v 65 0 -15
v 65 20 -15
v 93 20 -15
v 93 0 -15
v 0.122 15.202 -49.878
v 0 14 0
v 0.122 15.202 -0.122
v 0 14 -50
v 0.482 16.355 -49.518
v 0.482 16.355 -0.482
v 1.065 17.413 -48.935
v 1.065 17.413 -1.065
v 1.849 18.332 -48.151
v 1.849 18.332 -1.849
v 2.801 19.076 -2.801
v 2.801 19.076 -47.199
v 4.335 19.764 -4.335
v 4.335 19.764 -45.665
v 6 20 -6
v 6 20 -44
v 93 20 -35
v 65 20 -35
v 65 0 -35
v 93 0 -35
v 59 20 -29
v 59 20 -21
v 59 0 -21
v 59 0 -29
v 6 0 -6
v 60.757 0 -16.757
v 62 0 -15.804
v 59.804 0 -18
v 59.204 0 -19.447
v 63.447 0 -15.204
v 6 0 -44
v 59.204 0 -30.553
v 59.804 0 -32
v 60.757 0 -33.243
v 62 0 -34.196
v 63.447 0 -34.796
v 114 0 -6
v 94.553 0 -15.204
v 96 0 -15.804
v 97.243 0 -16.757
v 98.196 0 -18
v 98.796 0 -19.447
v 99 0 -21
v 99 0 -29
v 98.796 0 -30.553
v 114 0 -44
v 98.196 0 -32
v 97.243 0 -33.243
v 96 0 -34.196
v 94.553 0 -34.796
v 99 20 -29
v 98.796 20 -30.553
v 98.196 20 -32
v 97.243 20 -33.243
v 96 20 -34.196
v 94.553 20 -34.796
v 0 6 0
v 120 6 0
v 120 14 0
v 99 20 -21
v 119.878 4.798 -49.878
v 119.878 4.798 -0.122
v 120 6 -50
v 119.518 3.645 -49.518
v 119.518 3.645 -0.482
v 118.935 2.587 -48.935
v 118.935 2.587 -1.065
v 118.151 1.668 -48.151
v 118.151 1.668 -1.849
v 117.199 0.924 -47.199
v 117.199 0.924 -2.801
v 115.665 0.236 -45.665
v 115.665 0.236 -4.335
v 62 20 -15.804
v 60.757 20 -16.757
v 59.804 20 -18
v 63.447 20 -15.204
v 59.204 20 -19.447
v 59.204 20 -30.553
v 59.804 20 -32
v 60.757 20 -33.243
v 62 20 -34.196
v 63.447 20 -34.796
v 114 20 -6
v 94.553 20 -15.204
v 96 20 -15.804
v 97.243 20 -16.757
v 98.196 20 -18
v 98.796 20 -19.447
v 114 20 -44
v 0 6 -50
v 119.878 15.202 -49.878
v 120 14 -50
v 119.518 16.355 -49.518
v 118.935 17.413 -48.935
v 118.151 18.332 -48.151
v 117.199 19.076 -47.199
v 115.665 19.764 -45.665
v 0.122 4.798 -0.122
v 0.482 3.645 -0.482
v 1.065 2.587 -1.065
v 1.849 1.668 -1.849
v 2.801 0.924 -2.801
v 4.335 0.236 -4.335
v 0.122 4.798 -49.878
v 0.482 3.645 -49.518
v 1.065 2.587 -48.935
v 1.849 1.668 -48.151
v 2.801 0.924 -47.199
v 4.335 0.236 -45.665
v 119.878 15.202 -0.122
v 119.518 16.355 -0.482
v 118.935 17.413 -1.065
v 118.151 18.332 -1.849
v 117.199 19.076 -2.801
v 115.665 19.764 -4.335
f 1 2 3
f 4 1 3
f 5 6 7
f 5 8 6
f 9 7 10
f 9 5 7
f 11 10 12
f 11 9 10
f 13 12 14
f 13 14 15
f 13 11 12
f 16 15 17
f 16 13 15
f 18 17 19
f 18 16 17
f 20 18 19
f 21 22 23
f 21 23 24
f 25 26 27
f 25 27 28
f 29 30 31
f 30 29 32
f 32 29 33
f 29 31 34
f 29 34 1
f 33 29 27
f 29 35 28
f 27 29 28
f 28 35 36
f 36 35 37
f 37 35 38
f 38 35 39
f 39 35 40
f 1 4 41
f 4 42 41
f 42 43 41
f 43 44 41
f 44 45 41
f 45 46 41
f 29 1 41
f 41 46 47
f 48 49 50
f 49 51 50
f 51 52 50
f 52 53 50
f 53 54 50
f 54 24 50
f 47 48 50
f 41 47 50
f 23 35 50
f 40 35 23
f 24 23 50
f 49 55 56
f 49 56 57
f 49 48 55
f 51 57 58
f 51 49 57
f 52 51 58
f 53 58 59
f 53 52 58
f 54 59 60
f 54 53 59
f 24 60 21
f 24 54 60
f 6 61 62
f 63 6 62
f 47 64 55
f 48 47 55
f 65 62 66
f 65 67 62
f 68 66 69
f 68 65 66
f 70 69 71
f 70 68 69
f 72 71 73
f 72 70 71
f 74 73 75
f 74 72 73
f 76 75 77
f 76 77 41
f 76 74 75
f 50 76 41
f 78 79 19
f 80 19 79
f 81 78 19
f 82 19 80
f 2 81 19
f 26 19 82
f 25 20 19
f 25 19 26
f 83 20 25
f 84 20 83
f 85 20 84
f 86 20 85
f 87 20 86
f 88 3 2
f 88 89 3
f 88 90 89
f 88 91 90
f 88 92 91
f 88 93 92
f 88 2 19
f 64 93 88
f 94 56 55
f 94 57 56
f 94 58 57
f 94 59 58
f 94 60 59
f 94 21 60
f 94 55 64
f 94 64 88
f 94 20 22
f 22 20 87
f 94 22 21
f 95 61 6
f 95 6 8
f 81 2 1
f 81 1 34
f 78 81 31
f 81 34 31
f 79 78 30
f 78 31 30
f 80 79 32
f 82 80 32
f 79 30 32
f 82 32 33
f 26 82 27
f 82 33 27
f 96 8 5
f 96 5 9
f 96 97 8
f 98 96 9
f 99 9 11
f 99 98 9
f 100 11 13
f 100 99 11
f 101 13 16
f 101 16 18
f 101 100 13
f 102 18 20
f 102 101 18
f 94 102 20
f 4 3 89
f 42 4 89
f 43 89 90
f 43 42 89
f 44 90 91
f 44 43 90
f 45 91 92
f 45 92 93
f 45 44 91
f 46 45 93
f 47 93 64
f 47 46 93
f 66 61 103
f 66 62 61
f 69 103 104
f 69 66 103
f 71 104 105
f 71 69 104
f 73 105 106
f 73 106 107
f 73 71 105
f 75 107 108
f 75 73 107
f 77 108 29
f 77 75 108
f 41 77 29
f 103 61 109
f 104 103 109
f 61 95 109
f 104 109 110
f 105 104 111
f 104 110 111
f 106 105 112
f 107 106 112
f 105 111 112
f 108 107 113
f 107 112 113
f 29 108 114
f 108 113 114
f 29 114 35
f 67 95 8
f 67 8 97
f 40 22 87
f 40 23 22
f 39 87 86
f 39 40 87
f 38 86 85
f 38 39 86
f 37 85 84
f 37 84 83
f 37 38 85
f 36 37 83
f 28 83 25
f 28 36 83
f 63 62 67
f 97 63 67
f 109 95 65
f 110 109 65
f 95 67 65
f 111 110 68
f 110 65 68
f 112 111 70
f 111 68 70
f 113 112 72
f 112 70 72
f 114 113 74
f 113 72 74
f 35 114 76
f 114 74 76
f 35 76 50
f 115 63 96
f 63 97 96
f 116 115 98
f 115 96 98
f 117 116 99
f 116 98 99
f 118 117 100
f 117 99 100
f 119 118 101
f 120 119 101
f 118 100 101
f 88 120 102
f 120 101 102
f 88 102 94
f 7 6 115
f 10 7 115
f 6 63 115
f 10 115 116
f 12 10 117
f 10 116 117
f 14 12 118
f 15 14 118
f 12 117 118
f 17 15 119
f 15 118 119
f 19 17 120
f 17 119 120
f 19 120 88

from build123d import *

# Parameters (mm, degrees)
ESBO_O2_W                = 120
ESBO_O2_H                = 50
RESSALTO_EXTRUS_O1_DEPTH = 20
FILETE1_R                = 6
ESBO_O3_W                = 40
ESBO_O3_H                = 20
CORTE_EXTRUS_O1_DEPTH    = 132.52946438
FILETE2_R                = 6


with BuildPart() as part:
    # Esboço2 → Ressalto-extrusão1 (new body)
    with BuildSketch(Plane(origin=(0, 0, 0), x_dir=(1, 0, 0), z_dir=(0, 1, 0))):
        with Locations((60, 25)):
            Rectangle(ESBO_O2_W, ESBO_O2_H)
    extrude(amount=RESSALTO_EXTRUS_O1_DEPTH)

    # Filete1
    filete1_edges = [part.edges().sort_by_distance(p)[0] for p in [
        (120, 20, -25),
        (60, 20, -50),
        (0, 20, -25),
        (60, 0, -50),
        (120, 0, -25),
        (60, 0, 0),
        (0, 0, -25),
        (60, 20, 0),
    ]]
    fillet(filete1_edges, radius=FILETE1_R)

    # Esboço3 → Corte-extrusão1 (cut, through all)
    with BuildSketch(Plane(origin=(0, 20, 0), x_dir=(1, 0, 0), z_dir=(0, 1, 0))):
        with Locations((79, 25)):
            Rectangle(ESBO_O3_W, ESBO_O3_H)
    extrude(amount=-CORTE_EXTRUS_O1_DEPTH, mode=Mode.SUBTRACT)

    # Filete2
    filete2_edges = [part.edges().sort_by_distance(p)[0] for p in [
        (59, 10, -15),
        (59, 10, -35),
        (99, 10, -35),
        (99, 10, -15),
    ]]
    fillet(filete2_edges, radius=FILETE2_R)


solid = part.part
